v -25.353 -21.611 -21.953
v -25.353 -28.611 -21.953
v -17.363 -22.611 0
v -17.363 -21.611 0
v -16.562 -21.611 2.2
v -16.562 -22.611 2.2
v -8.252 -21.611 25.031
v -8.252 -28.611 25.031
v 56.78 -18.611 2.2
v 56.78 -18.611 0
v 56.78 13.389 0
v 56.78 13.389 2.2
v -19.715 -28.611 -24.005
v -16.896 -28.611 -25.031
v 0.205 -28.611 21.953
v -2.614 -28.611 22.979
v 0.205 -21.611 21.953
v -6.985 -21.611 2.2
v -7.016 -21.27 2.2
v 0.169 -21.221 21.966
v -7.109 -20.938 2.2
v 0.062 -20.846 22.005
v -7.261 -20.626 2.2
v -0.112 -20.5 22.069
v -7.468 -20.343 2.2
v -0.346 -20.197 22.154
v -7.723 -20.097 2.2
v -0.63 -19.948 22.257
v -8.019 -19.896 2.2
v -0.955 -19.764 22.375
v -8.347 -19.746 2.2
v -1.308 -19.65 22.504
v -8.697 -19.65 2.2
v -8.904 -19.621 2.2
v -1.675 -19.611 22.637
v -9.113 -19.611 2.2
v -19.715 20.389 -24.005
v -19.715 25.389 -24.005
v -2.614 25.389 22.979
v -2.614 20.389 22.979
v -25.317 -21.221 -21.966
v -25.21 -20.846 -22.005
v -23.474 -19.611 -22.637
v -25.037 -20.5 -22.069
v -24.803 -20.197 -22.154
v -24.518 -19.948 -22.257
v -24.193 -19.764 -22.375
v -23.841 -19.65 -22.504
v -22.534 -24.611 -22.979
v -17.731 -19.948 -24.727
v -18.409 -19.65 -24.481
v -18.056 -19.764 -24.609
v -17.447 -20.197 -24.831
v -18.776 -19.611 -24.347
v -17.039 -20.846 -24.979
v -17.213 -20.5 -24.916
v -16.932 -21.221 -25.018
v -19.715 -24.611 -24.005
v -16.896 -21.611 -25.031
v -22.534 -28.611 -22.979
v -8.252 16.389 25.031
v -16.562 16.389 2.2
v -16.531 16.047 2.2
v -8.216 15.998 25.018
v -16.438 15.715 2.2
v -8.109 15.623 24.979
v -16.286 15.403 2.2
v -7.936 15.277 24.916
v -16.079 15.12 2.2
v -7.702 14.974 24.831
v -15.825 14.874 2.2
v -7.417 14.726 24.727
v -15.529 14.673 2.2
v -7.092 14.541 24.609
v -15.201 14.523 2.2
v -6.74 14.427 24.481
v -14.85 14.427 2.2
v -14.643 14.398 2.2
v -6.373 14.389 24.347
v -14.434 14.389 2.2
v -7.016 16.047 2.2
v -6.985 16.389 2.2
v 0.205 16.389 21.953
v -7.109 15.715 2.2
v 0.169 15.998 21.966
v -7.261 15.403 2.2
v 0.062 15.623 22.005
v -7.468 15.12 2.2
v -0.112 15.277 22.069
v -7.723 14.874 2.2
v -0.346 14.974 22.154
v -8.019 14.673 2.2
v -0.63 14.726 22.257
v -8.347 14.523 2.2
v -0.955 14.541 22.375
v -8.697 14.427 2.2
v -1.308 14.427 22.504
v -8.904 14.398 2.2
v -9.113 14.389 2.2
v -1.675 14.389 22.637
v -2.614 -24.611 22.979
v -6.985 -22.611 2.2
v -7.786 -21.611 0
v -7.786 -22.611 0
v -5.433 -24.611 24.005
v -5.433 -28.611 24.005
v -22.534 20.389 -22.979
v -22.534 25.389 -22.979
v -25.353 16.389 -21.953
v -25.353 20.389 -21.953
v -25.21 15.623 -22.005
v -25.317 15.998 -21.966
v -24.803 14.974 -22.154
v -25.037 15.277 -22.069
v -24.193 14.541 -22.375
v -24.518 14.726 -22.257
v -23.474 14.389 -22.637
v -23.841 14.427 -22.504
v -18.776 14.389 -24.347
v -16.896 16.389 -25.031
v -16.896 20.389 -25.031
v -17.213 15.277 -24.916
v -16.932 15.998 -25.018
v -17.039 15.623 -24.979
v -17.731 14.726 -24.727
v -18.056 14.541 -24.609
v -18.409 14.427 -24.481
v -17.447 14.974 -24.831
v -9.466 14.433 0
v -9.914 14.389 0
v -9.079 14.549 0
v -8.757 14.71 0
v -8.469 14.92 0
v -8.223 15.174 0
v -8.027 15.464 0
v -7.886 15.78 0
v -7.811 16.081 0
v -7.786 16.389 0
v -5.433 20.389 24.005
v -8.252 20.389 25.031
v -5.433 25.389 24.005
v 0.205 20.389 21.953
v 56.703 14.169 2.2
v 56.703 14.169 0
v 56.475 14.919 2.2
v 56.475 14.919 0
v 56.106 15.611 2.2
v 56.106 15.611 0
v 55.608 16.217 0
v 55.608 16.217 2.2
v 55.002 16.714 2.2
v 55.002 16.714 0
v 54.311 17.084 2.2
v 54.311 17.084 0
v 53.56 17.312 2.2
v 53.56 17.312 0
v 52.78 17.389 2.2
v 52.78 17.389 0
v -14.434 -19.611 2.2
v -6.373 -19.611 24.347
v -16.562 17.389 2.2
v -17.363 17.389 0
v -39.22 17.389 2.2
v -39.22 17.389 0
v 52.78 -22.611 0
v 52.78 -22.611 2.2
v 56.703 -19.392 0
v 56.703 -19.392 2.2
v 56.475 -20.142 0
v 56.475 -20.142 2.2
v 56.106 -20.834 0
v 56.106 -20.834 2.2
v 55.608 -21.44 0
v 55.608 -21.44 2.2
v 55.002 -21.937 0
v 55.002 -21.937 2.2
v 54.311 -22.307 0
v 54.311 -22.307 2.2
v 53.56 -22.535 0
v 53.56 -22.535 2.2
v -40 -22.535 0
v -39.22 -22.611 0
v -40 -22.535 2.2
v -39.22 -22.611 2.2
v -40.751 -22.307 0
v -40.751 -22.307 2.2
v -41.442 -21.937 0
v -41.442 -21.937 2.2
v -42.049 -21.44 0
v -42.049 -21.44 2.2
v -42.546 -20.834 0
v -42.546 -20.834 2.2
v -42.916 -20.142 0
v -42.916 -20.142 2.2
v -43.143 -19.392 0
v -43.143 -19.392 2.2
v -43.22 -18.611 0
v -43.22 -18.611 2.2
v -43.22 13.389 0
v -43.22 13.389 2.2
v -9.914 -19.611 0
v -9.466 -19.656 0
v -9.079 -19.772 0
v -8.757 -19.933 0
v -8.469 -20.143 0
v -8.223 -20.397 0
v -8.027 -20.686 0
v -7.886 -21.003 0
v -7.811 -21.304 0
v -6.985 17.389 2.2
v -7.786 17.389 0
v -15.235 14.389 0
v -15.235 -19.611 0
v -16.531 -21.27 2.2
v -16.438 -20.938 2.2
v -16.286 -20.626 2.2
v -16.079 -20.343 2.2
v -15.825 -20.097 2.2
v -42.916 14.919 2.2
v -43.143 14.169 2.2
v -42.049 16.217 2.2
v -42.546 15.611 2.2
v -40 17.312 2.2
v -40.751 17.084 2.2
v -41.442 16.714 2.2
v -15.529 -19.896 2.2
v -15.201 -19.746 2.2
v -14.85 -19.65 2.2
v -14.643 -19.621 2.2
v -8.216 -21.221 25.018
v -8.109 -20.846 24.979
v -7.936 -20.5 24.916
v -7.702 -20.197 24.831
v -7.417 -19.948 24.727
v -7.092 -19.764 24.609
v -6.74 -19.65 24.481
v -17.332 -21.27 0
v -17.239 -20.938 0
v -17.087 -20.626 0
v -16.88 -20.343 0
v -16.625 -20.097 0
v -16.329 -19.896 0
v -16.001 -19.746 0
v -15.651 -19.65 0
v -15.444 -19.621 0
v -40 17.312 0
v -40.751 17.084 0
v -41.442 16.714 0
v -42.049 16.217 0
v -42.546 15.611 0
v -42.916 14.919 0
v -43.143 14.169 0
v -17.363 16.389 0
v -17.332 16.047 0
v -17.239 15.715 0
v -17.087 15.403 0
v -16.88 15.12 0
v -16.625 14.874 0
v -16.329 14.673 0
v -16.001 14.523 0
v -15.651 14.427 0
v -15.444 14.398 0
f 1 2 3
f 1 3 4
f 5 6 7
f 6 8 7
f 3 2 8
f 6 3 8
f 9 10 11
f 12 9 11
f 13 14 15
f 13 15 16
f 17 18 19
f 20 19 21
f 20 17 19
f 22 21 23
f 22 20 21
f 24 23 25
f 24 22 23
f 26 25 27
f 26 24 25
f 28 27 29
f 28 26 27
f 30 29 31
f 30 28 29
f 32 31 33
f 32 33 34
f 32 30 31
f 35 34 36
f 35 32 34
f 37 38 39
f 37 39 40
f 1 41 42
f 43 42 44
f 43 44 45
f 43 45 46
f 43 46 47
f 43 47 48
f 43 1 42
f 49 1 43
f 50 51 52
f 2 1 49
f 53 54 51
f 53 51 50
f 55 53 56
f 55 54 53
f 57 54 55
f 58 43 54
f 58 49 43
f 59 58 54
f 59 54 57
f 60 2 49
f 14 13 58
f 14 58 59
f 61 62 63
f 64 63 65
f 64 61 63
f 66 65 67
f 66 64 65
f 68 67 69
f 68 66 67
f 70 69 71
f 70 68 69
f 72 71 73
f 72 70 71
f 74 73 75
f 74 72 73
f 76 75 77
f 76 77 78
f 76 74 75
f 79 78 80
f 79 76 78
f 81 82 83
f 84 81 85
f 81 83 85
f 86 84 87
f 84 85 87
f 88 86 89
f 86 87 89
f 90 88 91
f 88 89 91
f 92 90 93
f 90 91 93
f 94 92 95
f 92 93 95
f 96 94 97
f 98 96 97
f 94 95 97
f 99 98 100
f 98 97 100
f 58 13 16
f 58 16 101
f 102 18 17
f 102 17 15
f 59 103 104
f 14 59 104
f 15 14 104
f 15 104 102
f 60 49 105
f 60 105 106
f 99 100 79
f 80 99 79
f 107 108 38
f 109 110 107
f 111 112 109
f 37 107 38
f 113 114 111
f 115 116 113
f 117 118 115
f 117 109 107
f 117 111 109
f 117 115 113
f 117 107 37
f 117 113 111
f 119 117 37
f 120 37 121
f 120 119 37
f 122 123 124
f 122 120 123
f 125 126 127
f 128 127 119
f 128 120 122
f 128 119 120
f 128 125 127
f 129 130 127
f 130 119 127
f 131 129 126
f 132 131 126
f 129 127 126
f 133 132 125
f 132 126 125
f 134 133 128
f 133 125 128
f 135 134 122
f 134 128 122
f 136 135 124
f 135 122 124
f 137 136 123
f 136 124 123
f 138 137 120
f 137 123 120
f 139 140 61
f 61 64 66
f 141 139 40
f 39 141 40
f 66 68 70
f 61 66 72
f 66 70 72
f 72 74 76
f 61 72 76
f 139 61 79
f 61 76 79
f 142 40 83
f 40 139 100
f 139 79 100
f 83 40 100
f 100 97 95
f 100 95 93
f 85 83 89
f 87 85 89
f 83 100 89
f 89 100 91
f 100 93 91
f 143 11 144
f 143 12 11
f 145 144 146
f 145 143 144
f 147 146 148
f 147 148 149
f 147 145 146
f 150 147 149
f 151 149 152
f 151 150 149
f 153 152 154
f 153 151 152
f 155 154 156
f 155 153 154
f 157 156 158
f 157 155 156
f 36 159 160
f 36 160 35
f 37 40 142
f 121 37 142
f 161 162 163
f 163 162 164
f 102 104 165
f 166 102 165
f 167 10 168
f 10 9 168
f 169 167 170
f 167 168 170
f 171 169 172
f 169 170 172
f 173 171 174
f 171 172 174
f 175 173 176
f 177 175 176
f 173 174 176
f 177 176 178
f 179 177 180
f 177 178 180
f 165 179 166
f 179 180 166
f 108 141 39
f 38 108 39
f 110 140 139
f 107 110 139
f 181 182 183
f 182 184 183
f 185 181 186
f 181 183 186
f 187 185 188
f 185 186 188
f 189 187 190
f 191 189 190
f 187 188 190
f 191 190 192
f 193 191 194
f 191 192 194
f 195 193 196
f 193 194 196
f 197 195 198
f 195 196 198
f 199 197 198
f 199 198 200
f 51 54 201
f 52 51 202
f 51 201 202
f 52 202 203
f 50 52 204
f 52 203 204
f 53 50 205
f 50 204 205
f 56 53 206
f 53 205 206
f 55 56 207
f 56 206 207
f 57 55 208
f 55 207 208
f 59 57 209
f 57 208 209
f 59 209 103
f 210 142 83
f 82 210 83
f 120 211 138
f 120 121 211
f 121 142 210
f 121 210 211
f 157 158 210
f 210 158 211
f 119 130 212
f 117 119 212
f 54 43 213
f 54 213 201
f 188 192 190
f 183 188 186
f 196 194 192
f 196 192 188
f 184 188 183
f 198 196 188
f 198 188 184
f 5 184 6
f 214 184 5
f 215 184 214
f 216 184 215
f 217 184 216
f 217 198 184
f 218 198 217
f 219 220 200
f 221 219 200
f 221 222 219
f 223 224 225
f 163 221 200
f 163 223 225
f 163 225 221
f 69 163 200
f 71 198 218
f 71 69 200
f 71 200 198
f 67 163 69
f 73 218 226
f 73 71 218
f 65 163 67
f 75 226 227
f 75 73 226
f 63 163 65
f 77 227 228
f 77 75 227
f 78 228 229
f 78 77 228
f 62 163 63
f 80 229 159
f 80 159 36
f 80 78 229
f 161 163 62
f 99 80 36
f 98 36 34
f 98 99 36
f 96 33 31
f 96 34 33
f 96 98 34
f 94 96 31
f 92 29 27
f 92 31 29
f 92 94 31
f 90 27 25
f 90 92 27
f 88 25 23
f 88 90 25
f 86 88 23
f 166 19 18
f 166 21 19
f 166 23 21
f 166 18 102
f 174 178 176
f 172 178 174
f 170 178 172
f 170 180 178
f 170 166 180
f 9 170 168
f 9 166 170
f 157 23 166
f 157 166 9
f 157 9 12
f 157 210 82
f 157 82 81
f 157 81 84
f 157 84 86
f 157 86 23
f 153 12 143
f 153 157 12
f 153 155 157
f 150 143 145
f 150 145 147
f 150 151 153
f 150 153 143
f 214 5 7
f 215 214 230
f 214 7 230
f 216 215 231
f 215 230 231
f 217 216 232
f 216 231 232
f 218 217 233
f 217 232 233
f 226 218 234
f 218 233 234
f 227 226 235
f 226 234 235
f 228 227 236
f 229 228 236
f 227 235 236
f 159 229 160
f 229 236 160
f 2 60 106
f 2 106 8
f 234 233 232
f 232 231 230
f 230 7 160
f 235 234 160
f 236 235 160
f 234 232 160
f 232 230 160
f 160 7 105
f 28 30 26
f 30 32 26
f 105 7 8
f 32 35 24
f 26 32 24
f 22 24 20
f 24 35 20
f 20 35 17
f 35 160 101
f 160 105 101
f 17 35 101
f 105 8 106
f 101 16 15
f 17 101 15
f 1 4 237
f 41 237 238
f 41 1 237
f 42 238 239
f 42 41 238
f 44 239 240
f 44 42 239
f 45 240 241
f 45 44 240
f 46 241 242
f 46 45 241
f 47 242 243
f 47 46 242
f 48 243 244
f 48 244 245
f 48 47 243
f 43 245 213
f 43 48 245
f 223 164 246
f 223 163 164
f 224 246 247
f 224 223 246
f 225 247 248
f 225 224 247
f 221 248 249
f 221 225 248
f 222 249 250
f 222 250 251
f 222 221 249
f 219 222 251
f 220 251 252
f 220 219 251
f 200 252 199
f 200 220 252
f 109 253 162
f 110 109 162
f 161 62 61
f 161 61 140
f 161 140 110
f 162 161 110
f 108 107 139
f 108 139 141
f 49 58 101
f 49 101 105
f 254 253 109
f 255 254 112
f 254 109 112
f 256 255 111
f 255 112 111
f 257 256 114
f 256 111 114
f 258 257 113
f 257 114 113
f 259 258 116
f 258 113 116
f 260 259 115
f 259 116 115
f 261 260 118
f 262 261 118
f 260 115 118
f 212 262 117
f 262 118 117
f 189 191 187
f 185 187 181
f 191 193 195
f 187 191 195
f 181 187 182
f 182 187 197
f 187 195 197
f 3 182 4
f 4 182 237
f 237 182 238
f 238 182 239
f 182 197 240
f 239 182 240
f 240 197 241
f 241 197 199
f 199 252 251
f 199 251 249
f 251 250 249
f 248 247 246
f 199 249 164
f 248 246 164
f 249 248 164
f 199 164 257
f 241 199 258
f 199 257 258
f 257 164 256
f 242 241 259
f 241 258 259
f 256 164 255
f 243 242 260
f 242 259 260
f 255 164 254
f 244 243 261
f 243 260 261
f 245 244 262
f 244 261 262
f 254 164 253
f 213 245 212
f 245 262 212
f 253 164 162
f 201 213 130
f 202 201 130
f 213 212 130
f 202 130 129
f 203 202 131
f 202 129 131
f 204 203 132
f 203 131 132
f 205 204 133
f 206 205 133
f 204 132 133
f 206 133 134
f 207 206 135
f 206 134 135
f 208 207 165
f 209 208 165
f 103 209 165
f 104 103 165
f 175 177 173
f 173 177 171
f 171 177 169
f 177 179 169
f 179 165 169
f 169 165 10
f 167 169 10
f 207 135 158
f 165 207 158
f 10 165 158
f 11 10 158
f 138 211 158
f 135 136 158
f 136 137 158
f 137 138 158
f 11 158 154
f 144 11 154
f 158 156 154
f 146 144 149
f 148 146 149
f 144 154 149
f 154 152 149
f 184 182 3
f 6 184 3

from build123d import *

# Parameters (mm, degrees)
F0_W          = 30.6458014898
F0_H          = 40
F0_W_2        = 69.3541985102
F1_DEPTH      = 2.2
F4_DEPTH      = 25
F4_DEPTH_BACK = 25
F5_R          = 4
F6_R          = 2


# Not quite as in the source:
# - a feature names something its author has since deleted; it is built from what else it names


with BuildPart() as f1:
    # F0 (on Top) → F1 (new body)
    with BuildSketch(Plane.XY):
        with Locations((-27.8972219743, -2.6114098728)):
            Rectangle(F0_W, F0_H)
        with Locations((22.1027780257, -2.6114098728)):
            Rectangle(F0_W_2, F0_H)
    extrude(amount=F1_DEPTH)

    # F3 (on line) → F4 (join, two sides)
    with BuildSketch(Plane(origin=(-1.4709161628, 0, -4.0413089432), x_dir=(0.9396926208, 0, -0.3420201433), z_dir=(-0.3420201433, 0, -0.9396926208))) as f4_sk:
        Polygon((-7.3159968707, -20.3885901272), (-7.3159968707, -14.3885901272), (-11.8159968707, -14.3885901272), (-11.8159968707, -25.3885901272), (-10.3159968707, -25.3885901272), (-10.3159968707, -20.3885901272), align=None)
        Polygon((-11.8159968707, 19.6114098728), (-7.3159968707, 19.6114098728), (-7.3159968707, 28.6114098728), (-10.3159968707, 28.6114098728), (-10.3159968707, 24.6114098728), (-11.8159968707, 24.6114098728), align=None)
        Polygon((-11.8159968707, -25.3885901272), (-11.8159968707, -14.3885901272), (-16.3159968707, -14.3885901272), (-16.3159968707, -20.3885901272), (-13.3159968707, -20.3885901272), (-13.3159968707, -25.3885901272), align=None)
        Polygon((-16.3159968707, 19.6114098728), (-11.8159968707, 19.6114098728), (-11.8159968707, 24.6114098728), (-13.3159968707, 24.6114098728), (-13.3159968707, 28.6114098728), (-16.3159968707, 28.6114098728), align=None)
    extrude(amount=F4_DEPTH)
    extrude(f4_sk.sketch, amount=-F4_DEPTH_BACK)

    # F5
    f5_edges = [f1.edges().sort_by_distance(p)[0] for p in [
        (-43.220123, 17.38859, 1.1),
        (-43.220123, -22.61141, 1.1),
        (56.779877, -22.61141, 1.1),
        (56.779877, 17.38859, 1.1),
    ]]
    fillet(f5_edges, radius=F5_R)

    # F6
    f6_edges = [f1.edges().sort_by_distance(p)[0] for p in [
        (-3.389994, -19.61141, 12.076612),
        (-12.407411, -19.61141, 13.615703),
        (-3.389994, 14.38859, 12.076612),
        (-12.340865, 14.38859, -12.515703),
        (-12.407411, 14.38859, 13.615703),
        (-21.358281, 14.38859, -10.976612),
        (-21.358281, -19.61141, -10.976612),
        (-12.340865, -19.61141, -12.515703),
    ]]
    fillet(f6_edges, radius=F6_R)


solid = f1.part
